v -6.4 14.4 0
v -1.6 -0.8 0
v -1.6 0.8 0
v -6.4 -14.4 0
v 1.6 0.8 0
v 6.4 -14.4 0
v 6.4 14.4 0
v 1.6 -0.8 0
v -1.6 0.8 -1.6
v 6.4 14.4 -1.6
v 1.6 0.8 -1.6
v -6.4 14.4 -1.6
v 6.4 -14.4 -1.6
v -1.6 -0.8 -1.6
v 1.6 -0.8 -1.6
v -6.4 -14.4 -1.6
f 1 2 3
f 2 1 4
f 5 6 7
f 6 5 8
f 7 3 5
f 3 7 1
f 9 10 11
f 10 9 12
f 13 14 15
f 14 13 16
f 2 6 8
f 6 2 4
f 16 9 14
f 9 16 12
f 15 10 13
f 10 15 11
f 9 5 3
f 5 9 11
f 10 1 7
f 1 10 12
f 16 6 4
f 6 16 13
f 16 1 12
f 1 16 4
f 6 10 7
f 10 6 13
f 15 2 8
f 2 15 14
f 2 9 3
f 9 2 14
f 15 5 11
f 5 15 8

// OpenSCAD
// file: ../p/4-4edge.scad
use <../lib.scad>
$fa=1; $fs=0.2;
function ldraw_lib__4_4edge(realsolid=false) = [
// 0 Circle 1.0
// 0 Name: 4-4edge.dat
// 0 Author: James Jessiman
// 0 !LDRAW_ORG Primitive UPDATE 2017-01
// 0 !LICENSE Licensed under CC BY 2.0 and CC BY 4.0 : see CAreadme.txt
// 
// 0 BFC CERTIFY CCW
  [0,"BFC","CERTIFY"],
  [0,"BFC","CCW"],
// 
// 0 !HISTORY 1998-12-15 [PTadmin] Official Update 1998-10
// 0 !HISTORY 2005-12-28 [PTadmin] Official Update 2005-01
// 0 !HISTORY 2007-06-24 [PTadmin] Header formatted for Contributor Agreement
// 0 !HISTORY 2008-07-01 [PTadmin] Official Update 2008-01
// 0 !HISTORY 2017-01-15 [Steffen] BFCed
// 0 !HISTORY 2017-12-30 [PTadmin] Official Update 2017-01
// 
// 
// 2 24 1 0 0 0.9239 0 0.3827
  [2,24,1,0,0,0.9239,0,0.3827],
// 2 24 0.9239 0 0.3827 0.7071 0 0.7071
  [2,24,0.9239,0,0.3827,0.7071,0,0.7071],
// 2 24 0.7071 0 0.7071 0.3827 0 0.9239
  [2,24,0.7071,0,0.7071,0.3827,0,0.9239],
// 2 24 0.3827 0 0.9239 0 0 1
  [2,24,0.3827,0,0.9239,0,0,1],
// 2 24 0 0 1 -0.3827 0 0.9239
  [2,24,0,0,1,-0.3827,0,0.9239],
// 2 24 -0.3827 0 0.9239 -0.7071 0 0.7071
  [2,24,-0.3827,0,0.9239,-0.7071,0,0.7071],
// 2 24 -0.7071 0 0.7071 -0.9239 0 0.3827
  [2,24,-0.7071,0,0.7071,-0.9239,0,0.3827],
// 2 24 -0.9239 0 0.3827 -1 0 -0
  [2,24,-0.9239,0,0.3827,-1,0,-0],
// 2 24 -1 0 -0 -0.9239 0 -0.3827
  [2,24,-1,0,-0,-0.9239,0,-0.3827],
// 2 24 -0.9239 0 -0.3827 -0.7071 0 -0.7071
  [2,24,-0.9239,0,-0.3827,-0.7071,0,-0.7071],
// 2 24 -0.7071 0 -0.7071 -0.3827 0 -0.9239
  [2,24,-0.7071,0,-0.7071,-0.3827,0,-0.9239],
// 2 24 -0.3827 0 -0.9239 0 0 -1
  [2,24,-0.3827,0,-0.9239,0,0,-1],
// 2 24 0 0 -1 0.3827 0 -0.9239
  [2,24,0,0,-1,0.3827,0,-0.9239],
// 2 24 0.3827 0 -0.9239 0.7071 0 -0.7071
  [2,24,0.3827,0,-0.9239,0.7071,0,-0.7071],
// 2 24 0.7071 0 -0.7071 0.9239 0 -0.3827
  [2,24,0.7071,0,-0.7071,0.9239,0,-0.3827],
// 2 24 0.9239 0 -0.3827 1 0 0
  [2,24,0.9239,0,-0.3827,1,0,0],
];
module ldraw_lib__4_4edge(step=0, col=false, unit=2/5, alt=false, line=0.2, solid=!$preview)
    makepoly(ldraw_lib__4_4edge(solid), step=step, col=col, unit=unit, alt=alt, line=line, solid=solid);
ldraw_lib__4_4edge(line=0.2);
// file: ../p/4-4disc.scad
use <../lib.scad>
$fa=1; $fs=0.2;
function ldraw_lib__4_4disc(realsolid=false) = [
// 0 Disc 1.0
// 0 Name: 4-4disc.dat
// 0 Author: James Jessiman
// 0 !LDRAW_ORG Primitive UPDATE 2002-02
// 0 !LICENSE Licensed under CC BY 2.0 and CC BY 4.0 : see CAreadme.txt
// 
// 0 BFC CERTIFY CCW
  [0,"BFC","CERTIFY"],
  [0,"BFC","CCW"],
// 
// 0 !HISTORY 1998-12-15 [PTadmin] Official Update 1998-10
// 0 !HISTORY 2002-03-23 [sbliss] Added BFC statement
// 0 !HISTORY 2002-04-25 [PTadmin] Official Update 2002-02
// 0 !HISTORY 2007-06-24 [PTadmin] Header formatted for Contributor Agreement
// 0 !HISTORY 2008-07-01 [PTadmin] Official Update 2008-01
// 
// 
// 3 16 0 0 0 1 0 0 0.9239 0 0.3827
  [3,16,0,0,0,1,0,0,0.9239,0,0.3827],
// 3 16 0 0 0 0.9239 0 0.3827 0.7071 0 0.7071
  [3,16,0,0,0,0.9239,0,0.3827,0.7071,0,0.7071],
// 3 16 0 0 0 0.7071 0 0.7071 0.3827 0 0.9239
  [3,16,0,0,0,0.7071,0,0.7071,0.3827,0,0.9239],
// 3 16 0 0 0 0.3827 0 0.9239 0 0 1
  [3,16,0,0,0,0.3827,0,0.9239,0,0,1],
// 3 16 0 0 0 0 0 1 -0.3827 0 0.9239
  [3,16,0,0,0,0,0,1,-0.3827,0,0.9239],
// 3 16 0 0 0 -0.3827 0 0.9239 -0.7071 0 0.7071
  [3,16,0,0,0,-0.3827,0,0.9239,-0.7071,0,0.7071],
// 3 16 0 0 0 -0.7071 0 0.7071 -0.9239 0 0.3827
  [3,16,0,0,0,-0.7071,0,0.7071,-0.9239,0,0.3827],
// 3 16 0 0 0 -0.9239 0 0.3827 -1 0 -0
  [3,16,0,0,0,-0.9239,0,0.3827,-1,0,-0],
// 3 16 0 0 0 -1 0 -0 -0.9239 0 -0.3827
  [3,16,0,0,0,-1,0,-0,-0.9239,0,-0.3827],
// 3 16 0 0 0 -0.9239 0 -0.3827 -0.7071 0 -0.7071
  [3,16,0,0,0,-0.9239,0,-0.3827,-0.7071,0,-0.7071],
// 3 16 0 0 0 -0.7071 0 -0.7071 -0.3827 0 -0.9239
  [3,16,0,0,0,-0.7071,0,-0.7071,-0.3827,0,-0.9239],
// 3 16 0 0 0 -0.3827 0 -0.9239 0 0 -1
  [3,16,0,0,0,-0.3827,0,-0.9239,0,0,-1],
// 3 16 0 0 0 0 0 -1 0.3827 0 -0.9239
  [3,16,0,0,0,0,0,-1,0.3827,0,-0.9239],
// 3 16 0 0 0 0.3827 0 -0.9239 0.7071 0 -0.7071
  [3,16,0,0,0,0.3827,0,-0.9239,0.7071,0,-0.7071],
// 3 16 0 0 0 0.7071 0 -0.7071 0.9239 0 -0.3827
  [3,16,0,0,0,0.7071,0,-0.7071,0.9239,0,-0.3827],
// 3 16 0 0 0 0.9239 0 -0.3827 1 0 0
  [3,16,0,0,0,0.9239,0,-0.3827,1,0,0],
// 0
];
module ldraw_lib__4_4disc(step=0, col=false, unit=2/5, alt=false, line=0.2, solid=!$preview)
    makepoly(ldraw_lib__4_4disc(solid), step=step, col=col, unit=unit, alt=alt, line=line, solid=solid);
ldraw_lib__4_4disc(line=0.2);
// file: ../p/4-4cyli.scad
use <../lib.scad>
$fa=1; $fs=0.2;
function ldraw_lib__4_4cyli(realsolid=false) = [
// 0 Cylinder 1.0
// 0 Name: 4-4cyli.dat
// 0 Author: James Jessiman
// 0 !LDRAW_ORG Primitive UPDATE 2005-01
// 0 !LICENSE Licensed under CC BY 2.0 and CC BY 4.0 : see CAreadme.txt
// 
// 0 BFC CERTIFY CCW
  [0,"BFC","CERTIFY"],
  [0,"BFC","CCW"],
// 
// 0 !HISTORY 1998-12-15 [PTadmin] Official Update 1998-10
// 0 !HISTORY 2002-03-23 [sbliss] Added BFC statement; merged headers from files in distributions LDraw 0.27 and Complete.
// 0 !HISTORY 2002-04-25 [PTadmin] Official Update 2002-02
// 0 !HISTORY 2004-12-14 [guyvivan] BFC CCW
// 0 !HISTORY 2005-12-28 [PTadmin] Official Update 2005-01
// 0 !HISTORY 2007-06-24 [PTadmin] Header formatted for Contributor Agreement
// 0 !HISTORY 2008-07-01 [PTadmin] Official Update 2008-01
// 
// 
// 4 16 1 1 0 0.9239 1 0.3827 0.9239 0 0.3827 1 0 0
  [4,16,1,1,0,0.9239,1,0.3827,0.9239,0,0.3827,1,0,0],
// 5 24 1 0 0 1 1 0 0.9239 0 0.3827 0.9239 0 -0.3827
  [5,24,1,0,0,1,1,0,0.9239,0,0.3827,0.9239,0,-0.3827],
// 4 16 0.9239 1 0.3827 0.7071 1 0.7071 0.7071 0 0.7071 0.9239 0 0.3827
  [4,16,0.9239,1,0.3827,0.7071,1,0.7071,0.7071,0,0.7071,0.9239,0,0.3827],
// 5 24 0.9239 0 0.3827 0.9239 1 0.3827 0.7071 0 0.7071 1 0 0
  [5,24,0.9239,0,0.3827,0.9239,1,0.3827,0.7071,0,0.7071,1,0,0],
// 4 16 0.7071 1 0.7071 0.3827 1 0.9239 0.3827 0 0.9239 0.7071 0 0.7071
  [4,16,0.7071,1,0.7071,0.3827,1,0.9239,0.3827,0,0.9239,0.7071,0,0.7071],
// 5 24 0.7071 0 0.7071 0.7071 1 0.7071 0.3827 0 0.9239 0.9239 0 0.3827
  [5,24,0.7071,0,0.7071,0.7071,1,0.7071,0.3827,0,0.9239,0.9239,0,0.3827],
// 4 16 0.3827 1 0.9239 0 1 1 0 0 1 0.3827 0 0.9239
  [4,16,0.3827,1,0.9239,0,1,1,0,0,1,0.3827,0,0.9239],
// 5 24 0.3827 0 0.9239 0.3827 1 0.9239 0 0 1 0.7071 0 0.7071
  [5,24,0.3827,0,0.9239,0.3827,1,0.9239,0,0,1,0.7071,0,0.7071],
// 4 16 0 1 1 -0.3827 1 0.9239 -0.3827 0 0.9239 0 0 1
  [4,16,0,1,1,-0.3827,1,0.9239,-0.3827,0,0.9239,0,0,1],
// 5 24 0 0 1 0 1 1 -0.3827 0 0.9239 0.3827 0 0.9239
  [5,24,0,0,1,0,1,1,-0.3827,0,0.9239,0.3827,0,0.9239],
// 4 16 -0.3827 1 0.9239 -0.7071 1 0.7071 -0.7071 0 0.7071 -0.3827 0 0.9239
  [4,16,-0.3827,1,0.9239,-0.7071,1,0.7071,-0.7071,0,0.7071,-0.3827,0,0.9239],
// 5 24 -0.3827 0 0.9239 -0.3827 1 0.9239 -0.7071 0 0.7071 0 0 1
  [5,24,-0.3827,0,0.9239,-0.3827,1,0.9239,-0.7071,0,0.7071,0,0,1],
// 4 16 -0.7071 1 0.7071 -0.9239 1 0.3827 -0.9239 0 0.3827 -0.7071 0 0.7071
  [4,16,-0.7071,1,0.7071,-0.9239,1,0.3827,-0.9239,0,0.3827,-0.7071,0,0.7071],
// 5 24 -0.7071 0 0.7071 -0.7071 1 0.7071 -0.9239 0 0.3827 -0.3827 0 0.9239
  [5,24,-0.7071,0,0.7071,-0.7071,1,0.7071,-0.9239,0,0.3827,-0.3827,0,0.9239],
// 4 16 -0.9239 1 0.3827 -1 1 0 -1 0 0 -0.9239 0 0.3827
  [4,16,-0.9239,1,0.3827,-1,1,0,-1,0,0,-0.9239,0,0.3827],
// 5 24 -0.9239 0 0.3827 -0.9239 1 0.3827 -1 0 0 -0.7071 0 0.7071
  [5,24,-0.9239,0,0.3827,-0.9239,1,0.3827,-1,0,0,-0.7071,0,0.7071],
// 4 16 -1 1 0 -0.9239 1 -0.3827 -0.9239 0 -0.3827 -1 0 0
  [4,16,-1,1,0,-0.9239,1,-0.3827,-0.9239,0,-0.3827,-1,0,0],
// 5 24 -1 0 0 -1 1 0 -0.9239 0 -0.3827 -0.9239 0 0.3827
  [5,24,-1,0,0,-1,1,0,-0.9239,0,-0.3827,-0.9239,0,0.3827],
// 4 16 -0.9239 1 -0.3827 -0.7071 1 -0.7071 -0.7071 0 -0.7071 -0.9239 0 -0.3827
  [4,16,-0.9239,1,-0.3827,-0.7071,1,-0.7071,-0.7071,0,-0.7071,-0.9239,0,-0.3827],
// 5 24 -0.9239 0 -0.3827 -0.9239 1 -0.3827 -0.7071 0 -0.7071 -1 0 0
  [5,24,-0.9239,0,-0.3827,-0.9239,1,-0.3827,-0.7071,0,-0.7071,-1,0,0],
// 4 16 -0.7071 1 -0.7071 -0.3827 1 -0.9239 -0.3827 0 -0.9239 -0.7071 0 -0.7071
  [4,16,-0.7071,1,-0.7071,-0.3827,1,-0.9239,-0.3827,0,-0.9239,-0.7071,0,-0.7071],
// 5 24 -0.7071 0 -0.7071 -0.7071 1 -0.7071 -0.3827 0 -0.9239 -0.9239 0 -0.3827
  [5,24,-0.7071,0,-0.7071,-0.7071,1,-0.7071,-0.3827,0,-0.9239,-0.9239,0,-0.3827],
// 4 16 -0.3827 1 -0.9239 0 1 -1 0 0 -1 -0.3827 0 -0.9239
  [4,16,-0.3827,1,-0.9239,0,1,-1,0,0,-1,-0.3827,0,-0.9239],
// 5 24 -0.3827 0 -0.9239 -0.3827 1 -0.9239 0 0 -1 -0.7071 0 -0.7071
  [5,24,-0.3827,0,-0.9239,-0.3827,1,-0.9239,0,0,-1,-0.7071,0,-0.7071],
// 4 16 0 1 -1 0.3827 1 -0.9239 0.3827 0 -0.9239 0 0 -1
  [4,16,0,1,-1,0.3827,1,-0.9239,0.3827,0,-0.9239,0,0,-1],
// 5 24 0 0 -1 0 1 -1 0.3827 0 -0.9239 -0.3827 0 -0.9239
  [5,24,0,0,-1,0,1,-1,0.3827,0,-0.9239,-0.3827,0,-0.9239],
// 4 16 0.3827 1 -0.9239 0.7071 1 -0.7071 0.7071 0 -0.7071 0.3827 0 -0.9239
  [4,16,0.3827,1,-0.9239,0.7071,1,-0.7071,0.7071,0,-0.7071,0.3827,0,-0.9239],
// 5 24 0.3827 0 -0.9239 0.3827 1 -0.9239 0.7071 0 -0.7071 0 0 -1
  [5,24,0.3827,0,-0.9239,0.3827,1,-0.9239,0.7071,0,-0.7071,0,0,-1],
// 4 16 0.7071 1 -0.7071 0.9239 1 -0.3827 0.9239 0 -0.3827 0.7071 0 -0.7071
  [4,16,0.7071,1,-0.7071,0.9239,1,-0.3827,0.9239,0,-0.3827,0.7071,0,-0.7071],
// 5 24 0.7071 0 -0.7071 0.7071 1 -0.7071 0.9239 0 -0.3827 0.3827 0 -0.9239
  [5,24,0.7071,0,-0.7071,0.7071,1,-0.7071,0.9239,0,-0.3827,0.3827,0,-0.9239],
// 4 16 0.9239 1 -0.3827 1 1 0 1 0 0 0.9239 0 -0.3827
  [4,16,0.9239,1,-0.3827,1,1,0,1,0,0,0.9239,0,-0.3827],
// 5 24 0.9239 0 -0.3827 0.9239 1 -0.3827 1 0 0 0.7071 0 -0.7071
  [5,24,0.9239,0,-0.3827,0.9239,1,-0.3827,1,0,0,0.7071,0,-0.7071],
// 0
];
module ldraw_lib__4_4cyli(step=0, col=false, unit=2/5, alt=false, line=0.2, solid=!$preview)
    makepoly(ldraw_lib__4_4cyli(solid), step=step, col=col, unit=unit, alt=alt, line=line, solid=solid);
ldraw_lib__4_4cyli(line=0.2);
// file: ../p/stud3.scad
use <../lib.scad>
use <4-4cyli.scad>
use <4-4disc.scad>
use <4-4edge.scad>
$fa=1; $fs=0.2;
function ldraw_lib__stud3(realsolid=false) = realsolid ? 
    [openscad(translate([0,0,-eps()], o=cylinder(4+eps(), r=4)),2)] : [
// 0 Stud Tube Solid
// 0 Name: stud3.dat
// 0 Author: James Jessiman
// 0 !LDRAW_ORG Primitive UPDATE 2012-01
// 0 !LICENSE Licensed under CC BY 2.0 and CC BY 4.0 : see CAreadme.txt
// 
// 0 BFC CERTIFY CCW
  [0,"BFC","CERTIFY"],
  [0,"BFC","CCW"],
// 
// 0 !HISTORY 2002-04-04 [sbliss] Modified for BFC compliance
// 0 !HISTORY 2002-04-25 [PTadmin] Official Update 2002-02
// 0 !HISTORY 2007-06-24 [PTadmin] Header formatted for Contributor Agreement
// 0 !HISTORY 2008-07-01 [PTadmin] Official Update 2008-01
// 0 !HISTORY 2012-02-16 [Philo] Changed to CCW
// 0 !HISTORY 2012-03-30 [PTadmin] Official Update 2012-01
// 
// 
// 1 16 0 -4 0 4 0 0 0 1 0 0 0 4 4-4edge.dat
  [1,16,0,-4,0,4,0,0,0,1,0,0,0,4, ldraw_lib__4_4edge(realsolid)],
// 1 16 0 0 0 4 0 0 0 1 0 0 0 4 4-4edge.dat
  [1,16,0,0,0,4,0,0,0,1,0,0,0,4, ldraw_lib__4_4edge(realsolid)],
// 1 16 0 -4 0 4 0 0 0 1 0 0 0 4 4-4disc.dat
  [1,16,0,-4,0,4,0,0,0,1,0,0,0,4, ldraw_lib__4_4disc(realsolid)],
// 1 16 0 -4 0 4 0 0 0 4 0 0 0 4 4-4cyli.dat
  [1,16,0,-4,0,4,0,0,0,4,0,0,0,4, ldraw_lib__4_4cyli(realsolid)],
];
module ldraw_lib__stud3(step=0, col=false, unit=2/5, alt=false, line=0.2, solid=!$preview)
    makepoly(ldraw_lib__stud3(solid), step=step, col=col, unit=unit, alt=alt, line=line, solid=solid);
ldraw_lib__stud3(line=0.2);
// file: ../p/stud.scad
use <../lib.scad>
use <4-4cyli.scad>
use <4-4disc.scad>
use <4-4edge.scad>
$fa=1; $fs=0.2;
function ldraw_lib__stud(realsolid=false) = realsolid ? 
    [openscad(translate([0,0,-eps()], o=cylinder(4+eps(), r=6)),2)] : [
// 0 Stud
// 0 Name: stud.dat
// 0 Author: James Jessiman
// 0 !LDRAW_ORG Primitive UPDATE 2012-01
// 0 !LICENSE Licensed under CC BY 2.0 and CC BY 4.0 : see CAreadme.txt
// 
// 0 BFC CERTIFY CCW
  [0,"BFC","CERTIFY"],
  [0,"BFC","CCW"],
// 
// 0 !HISTORY 2002-04-04 [sbliss] Modified for BFC compliance
// 0 !HISTORY 2002-04-25 [PTadmin] Official Update 2002-02
// 0 !HISTORY 2007-06-24 [PTadmin] Header formatted for Contributor Agreement
// 0 !HISTORY 2008-07-01 [PTadmin] Official Update 2008-01
// 0 !HISTORY 2012-02-16 [Philo] Changed to CCW
// 0 !HISTORY 2012-03-30 [PTadmin] Official Update 2012-01
// 
// 
// 1 16 0 0 0 6 0 0 0 1 0 0 0 6 4-4edge.dat
  [1,16,0,0,0,6,0,0,0,1,0,0,0,6, ldraw_lib__4_4edge(realsolid)],
// 1 16 0 -4 0 6 0 0 0 1 0 0 0 6 4-4edge.dat
  [1,16,0,-4,0,6,0,0,0,1,0,0,0,6, ldraw_lib__4_4edge(realsolid)],
// 1 16 0 0 0 6 0 0 0 -4 0 0 0 6 4-4cyli.dat
  [1,16,0,0,0,6,0,0,0,-4,0,0,0,6, ldraw_lib__4_4cyli(realsolid)],
// 1 16 0 -4 0 6 0 0 0 1 0 0 0 6 4-4disc.dat
  [1,16,0,-4,0,6,0,0,0,1,0,0,0,6, ldraw_lib__4_4disc(realsolid)],
];
module ldraw_lib__stud(step=0, col=false, unit=2/5, alt=false, line=0.2, solid=!$preview)
    makepoly(ldraw_lib__stud(solid), step=step, col=col, unit=unit, alt=alt, line=line, solid=solid);
ldraw_lib__stud(line=0.2);
// file: ../p/box5.scad
use <../lib.scad>
$fa=1; $fs=0.2;
function ldraw_lib__box5(realsolid=false) = [
// 0 Box with 5 Faces and All Edges
// 0 Name: box5.dat
// 0 Author: James Jessiman
// 0 !LDRAW_ORG Primitive UPDATE 2012-01
// 0 !LICENSE Licensed under CC BY 2.0 and CC BY 4.0 : see CAreadme.txt
// 
// 0 BFC CERTIFY CCW
  [0,"BFC","CERTIFY"],
  [0,"BFC","CCW"],
// 
// 0 !HISTORY 2002-04-03 [sbliss] Modified for BFC compliance
// 0 !HISTORY 2002-04-25 [PTadmin] Official Update 2002-02
// 0 !HISTORY 2007-06-24 [PTadmin] Header formatted for Contributor Agreement
// 0 !HISTORY 2008-07-01 [PTadmin] Official Update 2008-01
// 0 !HISTORY 2012-02-16 [Philo] Changed to CCW
// 0 !HISTORY 2012-03-30 [PTadmin] Official Update 2012-01
// 
// 
// 2 24 1 1 1 -1 1 1
  [2,24,1,1,1,-1,1,1],
// 2 24 -1 1 1 -1 1 -1
  [2,24,-1,1,1,-1,1,-1],
// 2 24 -1 1 -1 1 1 -1
  [2,24,-1,1,-1,1,1,-1],
// 2 24 1 1 -1 1 1 1
  [2,24,1,1,-1,1,1,1],
// 2 24 1 0 1 -1 0 1
  [2,24,1,0,1,-1,0,1],
// 2 24 -1 0 1 -1 0 -1
  [2,24,-1,0,1,-1,0,-1],
// 2 24 -1 0 -1 1 0 -1
  [2,24,-1,0,-1,1,0,-1],
// 2 24 1 0 -1 1 0 1
  [2,24,1,0,-1,1,0,1],
// 2 24 1 0 1 1 1 1
  [2,24,1,0,1,1,1,1],
// 2 24 -1 0 1 -1 1 1
  [2,24,-1,0,1,-1,1,1],
// 2 24 1 0 -1 1 1 -1
  [2,24,1,0,-1,1,1,-1],
// 2 24 -1 0 -1 -1 1 -1
  [2,24,-1,0,-1,-1,1,-1],
// 4 16 -1 1 1 1 1 1 1 1 -1 -1 1 -1
  [4,16,-1,1,1,1,1,1,1,1,-1,-1,1,-1],
// 4 16 -1 1 1 -1 0 1 1 0 1 1 1 1
  [4,16,-1,1,1,-1,0,1,1,0,1,1,1,1],
// 4 16 -1 1 -1 -1 0 -1 -1 0 1 -1 1 1
  [4,16,-1,1,-1,-1,0,-1,-1,0,1,-1,1,1],
// 4 16 1 1 -1 1 0 -1 -1 0 -1 -1 1 -1
  [4,16,1,1,-1,1,0,-1,-1,0,-1,-1,1,-1],
// 4 16 1 1 1 1 0 1 1 0 -1 1 1 -1
  [4,16,1,1,1,1,0,1,1,0,-1,1,1,-1],
];
module ldraw_lib__box5(step=0, col=false, unit=2/5, alt=false, line=0.2, solid=!$preview)
    makepoly(ldraw_lib__box5(solid), step=step, col=col, unit=unit, alt=alt, line=line, solid=solid);
ldraw_lib__box5(line=0.2);
// file: ../p/box4t.scad
use <../lib.scad>
$fa=1; $fs=0.2;
function ldraw_lib__box4t(realsolid=false) = [
// 0 Box with 4 Adjacent Faces and All Edges
// 0 Name: box4t.dat
// 0 Author: Tore Eriksson [Tore_Eriksson]
// 0 !LDRAW_ORG Primitive UPDATE 2003-02
// 0 !LICENSE Licensed under CC BY 2.0 and CC BY 4.0 : see CAreadme.txt
// 
// 0 BFC CERTIFY CCW
  [0,"BFC","CERTIFY"],
  [0,"BFC","CCW"],
// 
// 0 !HISTORY 1997-09-29 [PTadmin] Official Update 1997-15
// 0 !HISTORY 2002-08-31 [izanette] Modified with WINDZ for BFC compliance
// 0 !HISTORY 2003-08-01 [PTadmin] Official Update 2003-02
// 0 !HISTORY 2007-06-24 [PTadmin] Header formatted for Contributor Agreement
// 0 !HISTORY 2008-07-01 [PTadmin] Official Update 2008-01
// 
// 
// 2 24 1 1 1 -1 1 1
  [2,24,1,1,1,-1,1,1],
// 2 24 -1 1 1 -1 1 -1
  [2,24,-1,1,1,-1,1,-1],
// 2 24 -1 1 -1 1 1 -1
  [2,24,-1,1,-1,1,1,-1],
// 2 24 1 1 -1 1 1 1
  [2,24,1,1,-1,1,1,1],
// 2 24 1 0 1 -1 0 1
  [2,24,1,0,1,-1,0,1],
// 2 24 -1 0 1 -1 0 -1
  [2,24,-1,0,1,-1,0,-1],
// 2 24 -1 0 -1 1 0 -1
  [2,24,-1,0,-1,1,0,-1],
// 2 24 1 0 -1 1 0 1
  [2,24,1,0,-1,1,0,1],
// 2 24 1 0 1 1 1 1
  [2,24,1,0,1,1,1,1],
// 2 24 -1 0 1 -1 1 1
  [2,24,-1,0,1,-1,1,1],
// 2 24 1 0 -1 1 1 -1
  [2,24,1,0,-1,1,1,-1],
// 2 24 -1 0 -1 -1 1 -1
  [2,24,-1,0,-1,-1,1,-1],
// 4 16 1 1 1 1 1 -1 -1 1 -1 -1 1 1
  [4,16,1,1,1,1,1,-1,-1,1,-1,-1,1,1],
// 4 16 1 1 1 -1 1 1 -1 0 1 1 0 1
  [4,16,1,1,1,-1,1,1,-1,0,1,1,0,1],
// 4 16 -1 1 1 -1 1 -1 -1 0 -1 -1 0 1
  [4,16,-1,1,1,-1,1,-1,-1,0,-1,-1,0,1],
// 0 4 16 -1 1 -1 -1 0 -1 1 0 -1 1 1 -1
// 4 16 1 1 -1 1 1 1 1 0 1 1 0 -1
  [4,16,1,1,-1,1,1,1,1,0,1,1,0,-1],
// 0
];
module ldraw_lib__box4t(step=0, col=false, unit=2/5, alt=false, line=0.2, solid=!$preview)
    makepoly(ldraw_lib__box4t(solid), step=step, col=col, unit=unit, alt=alt, line=line, solid=solid);
ldraw_lib__box4t(line=0.2);
// file: s/3004s01.scad
use <../../lib.scad>
use <../../p/box4t.scad>
use <../../p/box5.scad>
use <../../p/stud.scad>
use <../../p/stud3.scad>
$fa=1; $fs=0.2;
function ldraw_lib__s__3004s01(realsolid=false) = [
// 0 ~Brick  1 x  2 without Front Face
// 0 Name: s\3004s01.dat
// 0 Author: James Jessiman
// 0 !LDRAW_ORG Subpart UPDATE 2003-03
// 0 !LICENSE Licensed under CC BY 2.0 and CC BY 4.0 : see CAreadme.txt
// 
// 0 BFC CERTIFY CCW
  [0,"BFC","CERTIFY"],
  [0,"BFC","CCW"],
// 
// 0 !HISTORY 2003-09-07 [jriley] Subfiling, BFC
// 0 !HISTORY 2003-12-19 [PTadmin] Official Update 2003-03
// 0 !HISTORY 2007-08-29 [PTadmin] Header formatted for Contributor Agreement
// 0 !HISTORY 2008-07-01 [PTadmin] Official Update 2008-01
// 
// 
// 1 16 0 4 0 1 0 0 0 -5 0 0 0 1 stud3.dat
  [1,16,0,4,0,1,0,0,0,-5,0,0,0,1, ldraw_lib__stud3(realsolid)],
// 0 BFC INVERTNEXT
  [0,"BFC","INVERTNEXT"],
// 1 16 0 24 0 16 0 0 0 -20 0 0 0 6 box5.dat
  [1,16,0,24,0,16,0,0,0,-20,0,0,0,6, ldraw_lib__box5(realsolid)],
// 4 16 20 24 10 16 24 6 -16 24 6 -20 24 10
  [4,16,20,24,10,16,24,6,-16,24,6,-20,24,10],
// 4 16 -20 24 10 -16 24 6 -16 24 -6 -20 24 -10
  [4,16,-20,24,10,-16,24,6,-16,24,-6,-20,24,-10],
// 4 16 -20 24 -10 -16 24 -6 16 24 -6 20 24 -10
  [4,16,-20,24,-10,-16,24,-6,16,24,-6,20,24,-10],
// 4 16 20 24 -10 16 24 -6 16 24 6 20 24 10
  [4,16,20,24,-10,16,24,-6,16,24,6,20,24,10],
// 1 16 0 24 0 20 0 0 0 -24 0 0 0 10 box4t.dat
  [1,16,0,24,0,20,0,0,0,-24,0,0,0,10, ldraw_lib__box4t(realsolid)],
// 1 16 10 0 0 1 0 0 0 1 0 0 0 1 stud.dat
  [1,16,10,0,0,1,0,0,0,1,0,0,0,1, ldraw_lib__stud(realsolid)],
// 1 16 -10 0 0 1 0 0 0 1 0 0 0 1 stud.dat
  [1,16,-10,0,0,1,0,0,0,1,0,0,0,1, ldraw_lib__stud(realsolid)],
// 0
];
module ldraw_lib__s__3004s01(step=0, col=false, unit=2/5, alt=false, line=0.2, solid=!$preview)
    makepoly(ldraw_lib__s__3004s01(solid), step=step, col=col, unit=unit, alt=alt, line=line, solid=solid);
ldraw_lib__s__3004s01(line=0.2);
// file: 3004.scad
use <../lib.scad>
use <s/3004s01.scad>
$fa=1; $fs=0.2;
function ldraw_lib__3004(realsolid=false) = [
// 0 Brick  1 x  2
// 0 Name: 3004.dat
// 0 Author: James Jessiman
// 0 !LDRAW_ORG Part UPDATE 2022-05
// 0 !LICENSE Licensed under CC BY 2.0 and CC BY 4.0 : see CAreadme.txt
// 
// 0 BFC CERTIFY CCW
  [0,"BFC","CERTIFY"],
  [0,"BFC","CCW"],
// 
// 0 !HISTORY 2001-10-26 [PTadmin] Official Update 2001-01
// 0 !HISTORY 2002-05-07 {unknown} BFC Certification
// 0 !HISTORY 2002-06-11 [PTadmin] Official Update 2002-03
// 0 !HISTORY 2007-05-07 [PTadmin] Header formatted for Contributor Agreement
// 0 !HISTORY 2008-07-01 [PTadmin] Official Update 2008-01
// 0 !HISTORY 2022-08-04 [MagFors] Using subfile
// 0 !HISTORY 2022-09-15 [PTadmin] Official Update 2022-05
// 
// 
// 1 16 0 0 0 1 0 0 0 1 0 0 0 1 s\3004s01.dat
  [1,16,0,0,0,1,0,0,0,1,0,0,0,1, ldraw_lib__s__3004s01(realsolid)],
// 4 16 -20 24 -10 20 24 -10 20 0 -10 -20 0 -10
  [4,16,-20,24,-10,20,24,-10,20,0,-10,-20,0,-10],
];
module ldraw_lib__3004(step=0, col=false, unit=2/5, alt=false, line=0.2, solid=!$preview)
    makepoly(ldraw_lib__3004(solid), step=step, col=col, unit=unit, alt=alt, line=line, solid=solid);
ldraw_lib__3004(line=0.2);
// main file
use <../lib.scad>
$fa=1; $fs=0.2;
function ldraw_lib__u9065(realsolid=false) = [
// 0 ~Electric Train  4.5V On/Off Switch Brick  2 x  4 Bottom Plate
// 0 Name: u9065.dat
// 0 Author: Michael Heidemann [mikeheide]
// 0 !LDRAW_ORG Part UPDATE 2013-01
// 0 !LICENSE Licensed under CC BY 2.0 and CC BY 4.0 : see CAreadme.txt
// 
// 0 BFC CERTIFY CCW
  [0,"BFC","CERTIFY"],
  [0,"BFC","CCW"],
// 
// 0 !HISTORY 2013-07-21 [PTadmin] Official Update 2013-01
// 
// 
// 2 24 -16 0 36 -16 0 -36
  [2,24,-16,0,36,-16,0,-36],
// 4 16 -16 0 36 -16 0 -36 -4 0 -2 -4 0 2
  [4,16,-16,0,36,-16,0,-36,-4,0,-2,-4,0,2],
// 4 16 4 0 2 4 0 -2 16 0 -36 16 0 36
  [4,16,4,0,2,4,0,-2,16,0,-36,16,0,36],
// 4 16 16 0 36 -16 0 36 -4 0 2 4 0 2
  [4,16,16,0,36,-16,0,36,-4,0,2,4,0,2],
// 4 16 4 4 2 -4 4 2 -16 4 36 16 4 36
  [4,16,4,4,2,-4,4,2,-16,4,36,16,4,36],
// 4 16 16 4 -36 -16 4 -36 -4 4 -2 4 4 -2
  [4,16,16,4,-36,-16,4,-36,-4,4,-2,4,4,-2],
// 4 16 4 0 -2 -4 0 -2 -16 0 -36 16 0 -36
  [4,16,4,0,-2,-4,0,-2,-16,0,-36,16,0,-36],
// 4 16 -4 4 2 -4 4 -2 -16 4 -36 -16 4 36
  [4,16,-4,4,2,-4,4,-2,-16,4,-36,-16,4,36],
// 4 16 16 4 36 16 4 -36 4 4 -2 4 4 2
  [4,16,16,4,36,16,4,-36,4,4,-2,4,4,2],
// 2 24 -16 0 36 16 0 36
  [2,24,-16,0,36,16,0,36],
// 2 24 -16 0 -36 16 0 -36
  [2,24,-16,0,-36,16,0,-36],
// 2 24 16 0 36 16 0 -36
  [2,24,16,0,36,16,0,-36],
// 2 24 -16 4 36 -16 4 -36
  [2,24,-16,4,36,-16,4,-36],
// 2 24 -16 4 36 16 4 36
  [2,24,-16,4,36,16,4,36],
// 2 24 -16 4 -36 16 4 -36
  [2,24,-16,4,-36,16,4,-36],
// 2 24 16 4 36 16 4 -36
  [2,24,16,4,36,16,4,-36],
// 2 24 16 0 -36 16 4 -36
  [2,24,16,0,-36,16,4,-36],
// 2 24 -16 0 -36 -16 4 -36
  [2,24,-16,0,-36,-16,4,-36],
// 2 24 16 0 36 16 4 36
  [2,24,16,0,36,16,4,36],
// 2 24 -16 0 36 -16 4 36
  [2,24,-16,0,36,-16,4,36],
// 2 24 4 0 2 -4 0 2
  [2,24,4,0,2,-4,0,2],
// 2 24 4 0 -2 -4 0 -2
  [2,24,4,0,-2,-4,0,-2],
// 2 24 -4 0 2 -4 0 -2
  [2,24,-4,0,2,-4,0,-2],
// 2 24 4 0 2 4 0 -2
  [2,24,4,0,2,4,0,-2],
// 2 24 4 4 2 -4 4 2
  [2,24,4,4,2,-4,4,2],
// 2 24 4 4 -2 -4 4 -2
  [2,24,4,4,-2,-4,4,-2],
// 2 24 -4 4 2 -4 4 -2
  [2,24,-4,4,2,-4,4,-2],
// 2 24 4 4 2 4 4 -2
  [2,24,4,4,2,4,4,-2],
// 2 24 4 4 2 4 0 2
  [2,24,4,4,2,4,0,2],
// 2 24 4 4 -2 4 0 -2
  [2,24,4,4,-2,4,0,-2],
// 2 24 -4 4 2 -4 0 2
  [2,24,-4,4,2,-4,0,2],
// 4 16 4 4 2 4 0 2 -4 0 2 -4 4 2
  [4,16,4,4,2,4,0,2,-4,0,2,-4,4,2],
// 4 16 -16 4 36 -16 0 36 16 0 36 16 4 36
  [4,16,-16,4,36,-16,0,36,16,0,36,16,4,36],
// 4 16 16 4 -36 16 0 -36 -16 0 -36 -16 4 -36
  [4,16,16,4,-36,16,0,-36,-16,0,-36,-16,4,-36],
// 4 16 -16 4 -36 -16 0 -36 -16 0 36 -16 4 36
  [4,16,-16,4,-36,-16,0,-36,-16,0,36,-16,4,36],
// 4 16 16 4 36 16 0 36 16 0 -36 16 4 -36
  [4,16,16,4,36,16,0,36,16,0,-36,16,4,-36],
// 4 16 -4 4 -2 -4 0 -2 4 0 -2 4 4 -2
  [4,16,-4,4,-2,-4,0,-2,4,0,-2,4,4,-2],
// 4 16 -4 4 2 -4 0 2 -4 0 -2 -4 4 -2
  [4,16,-4,4,2,-4,0,2,-4,0,-2,-4,4,-2],
// 4 16 4 4 -2 4 0 -2 4 0 2 4 4 2
  [4,16,4,4,-2,4,0,-2,4,0,2,4,4,2],
// 2 24 -4 4 -2 -4 0 -2
  [2,24,-4,4,-2,-4,0,-2],
];
module ldraw_lib__u9065(step=0, col=false, unit=2/5, alt=false, line=0.2, solid=!$preview)
    makepoly(ldraw_lib__u9065(solid), step=step, col=col, unit=unit, alt=alt, line=line, solid=solid);
ldraw_lib__u9065(line=0.2);
